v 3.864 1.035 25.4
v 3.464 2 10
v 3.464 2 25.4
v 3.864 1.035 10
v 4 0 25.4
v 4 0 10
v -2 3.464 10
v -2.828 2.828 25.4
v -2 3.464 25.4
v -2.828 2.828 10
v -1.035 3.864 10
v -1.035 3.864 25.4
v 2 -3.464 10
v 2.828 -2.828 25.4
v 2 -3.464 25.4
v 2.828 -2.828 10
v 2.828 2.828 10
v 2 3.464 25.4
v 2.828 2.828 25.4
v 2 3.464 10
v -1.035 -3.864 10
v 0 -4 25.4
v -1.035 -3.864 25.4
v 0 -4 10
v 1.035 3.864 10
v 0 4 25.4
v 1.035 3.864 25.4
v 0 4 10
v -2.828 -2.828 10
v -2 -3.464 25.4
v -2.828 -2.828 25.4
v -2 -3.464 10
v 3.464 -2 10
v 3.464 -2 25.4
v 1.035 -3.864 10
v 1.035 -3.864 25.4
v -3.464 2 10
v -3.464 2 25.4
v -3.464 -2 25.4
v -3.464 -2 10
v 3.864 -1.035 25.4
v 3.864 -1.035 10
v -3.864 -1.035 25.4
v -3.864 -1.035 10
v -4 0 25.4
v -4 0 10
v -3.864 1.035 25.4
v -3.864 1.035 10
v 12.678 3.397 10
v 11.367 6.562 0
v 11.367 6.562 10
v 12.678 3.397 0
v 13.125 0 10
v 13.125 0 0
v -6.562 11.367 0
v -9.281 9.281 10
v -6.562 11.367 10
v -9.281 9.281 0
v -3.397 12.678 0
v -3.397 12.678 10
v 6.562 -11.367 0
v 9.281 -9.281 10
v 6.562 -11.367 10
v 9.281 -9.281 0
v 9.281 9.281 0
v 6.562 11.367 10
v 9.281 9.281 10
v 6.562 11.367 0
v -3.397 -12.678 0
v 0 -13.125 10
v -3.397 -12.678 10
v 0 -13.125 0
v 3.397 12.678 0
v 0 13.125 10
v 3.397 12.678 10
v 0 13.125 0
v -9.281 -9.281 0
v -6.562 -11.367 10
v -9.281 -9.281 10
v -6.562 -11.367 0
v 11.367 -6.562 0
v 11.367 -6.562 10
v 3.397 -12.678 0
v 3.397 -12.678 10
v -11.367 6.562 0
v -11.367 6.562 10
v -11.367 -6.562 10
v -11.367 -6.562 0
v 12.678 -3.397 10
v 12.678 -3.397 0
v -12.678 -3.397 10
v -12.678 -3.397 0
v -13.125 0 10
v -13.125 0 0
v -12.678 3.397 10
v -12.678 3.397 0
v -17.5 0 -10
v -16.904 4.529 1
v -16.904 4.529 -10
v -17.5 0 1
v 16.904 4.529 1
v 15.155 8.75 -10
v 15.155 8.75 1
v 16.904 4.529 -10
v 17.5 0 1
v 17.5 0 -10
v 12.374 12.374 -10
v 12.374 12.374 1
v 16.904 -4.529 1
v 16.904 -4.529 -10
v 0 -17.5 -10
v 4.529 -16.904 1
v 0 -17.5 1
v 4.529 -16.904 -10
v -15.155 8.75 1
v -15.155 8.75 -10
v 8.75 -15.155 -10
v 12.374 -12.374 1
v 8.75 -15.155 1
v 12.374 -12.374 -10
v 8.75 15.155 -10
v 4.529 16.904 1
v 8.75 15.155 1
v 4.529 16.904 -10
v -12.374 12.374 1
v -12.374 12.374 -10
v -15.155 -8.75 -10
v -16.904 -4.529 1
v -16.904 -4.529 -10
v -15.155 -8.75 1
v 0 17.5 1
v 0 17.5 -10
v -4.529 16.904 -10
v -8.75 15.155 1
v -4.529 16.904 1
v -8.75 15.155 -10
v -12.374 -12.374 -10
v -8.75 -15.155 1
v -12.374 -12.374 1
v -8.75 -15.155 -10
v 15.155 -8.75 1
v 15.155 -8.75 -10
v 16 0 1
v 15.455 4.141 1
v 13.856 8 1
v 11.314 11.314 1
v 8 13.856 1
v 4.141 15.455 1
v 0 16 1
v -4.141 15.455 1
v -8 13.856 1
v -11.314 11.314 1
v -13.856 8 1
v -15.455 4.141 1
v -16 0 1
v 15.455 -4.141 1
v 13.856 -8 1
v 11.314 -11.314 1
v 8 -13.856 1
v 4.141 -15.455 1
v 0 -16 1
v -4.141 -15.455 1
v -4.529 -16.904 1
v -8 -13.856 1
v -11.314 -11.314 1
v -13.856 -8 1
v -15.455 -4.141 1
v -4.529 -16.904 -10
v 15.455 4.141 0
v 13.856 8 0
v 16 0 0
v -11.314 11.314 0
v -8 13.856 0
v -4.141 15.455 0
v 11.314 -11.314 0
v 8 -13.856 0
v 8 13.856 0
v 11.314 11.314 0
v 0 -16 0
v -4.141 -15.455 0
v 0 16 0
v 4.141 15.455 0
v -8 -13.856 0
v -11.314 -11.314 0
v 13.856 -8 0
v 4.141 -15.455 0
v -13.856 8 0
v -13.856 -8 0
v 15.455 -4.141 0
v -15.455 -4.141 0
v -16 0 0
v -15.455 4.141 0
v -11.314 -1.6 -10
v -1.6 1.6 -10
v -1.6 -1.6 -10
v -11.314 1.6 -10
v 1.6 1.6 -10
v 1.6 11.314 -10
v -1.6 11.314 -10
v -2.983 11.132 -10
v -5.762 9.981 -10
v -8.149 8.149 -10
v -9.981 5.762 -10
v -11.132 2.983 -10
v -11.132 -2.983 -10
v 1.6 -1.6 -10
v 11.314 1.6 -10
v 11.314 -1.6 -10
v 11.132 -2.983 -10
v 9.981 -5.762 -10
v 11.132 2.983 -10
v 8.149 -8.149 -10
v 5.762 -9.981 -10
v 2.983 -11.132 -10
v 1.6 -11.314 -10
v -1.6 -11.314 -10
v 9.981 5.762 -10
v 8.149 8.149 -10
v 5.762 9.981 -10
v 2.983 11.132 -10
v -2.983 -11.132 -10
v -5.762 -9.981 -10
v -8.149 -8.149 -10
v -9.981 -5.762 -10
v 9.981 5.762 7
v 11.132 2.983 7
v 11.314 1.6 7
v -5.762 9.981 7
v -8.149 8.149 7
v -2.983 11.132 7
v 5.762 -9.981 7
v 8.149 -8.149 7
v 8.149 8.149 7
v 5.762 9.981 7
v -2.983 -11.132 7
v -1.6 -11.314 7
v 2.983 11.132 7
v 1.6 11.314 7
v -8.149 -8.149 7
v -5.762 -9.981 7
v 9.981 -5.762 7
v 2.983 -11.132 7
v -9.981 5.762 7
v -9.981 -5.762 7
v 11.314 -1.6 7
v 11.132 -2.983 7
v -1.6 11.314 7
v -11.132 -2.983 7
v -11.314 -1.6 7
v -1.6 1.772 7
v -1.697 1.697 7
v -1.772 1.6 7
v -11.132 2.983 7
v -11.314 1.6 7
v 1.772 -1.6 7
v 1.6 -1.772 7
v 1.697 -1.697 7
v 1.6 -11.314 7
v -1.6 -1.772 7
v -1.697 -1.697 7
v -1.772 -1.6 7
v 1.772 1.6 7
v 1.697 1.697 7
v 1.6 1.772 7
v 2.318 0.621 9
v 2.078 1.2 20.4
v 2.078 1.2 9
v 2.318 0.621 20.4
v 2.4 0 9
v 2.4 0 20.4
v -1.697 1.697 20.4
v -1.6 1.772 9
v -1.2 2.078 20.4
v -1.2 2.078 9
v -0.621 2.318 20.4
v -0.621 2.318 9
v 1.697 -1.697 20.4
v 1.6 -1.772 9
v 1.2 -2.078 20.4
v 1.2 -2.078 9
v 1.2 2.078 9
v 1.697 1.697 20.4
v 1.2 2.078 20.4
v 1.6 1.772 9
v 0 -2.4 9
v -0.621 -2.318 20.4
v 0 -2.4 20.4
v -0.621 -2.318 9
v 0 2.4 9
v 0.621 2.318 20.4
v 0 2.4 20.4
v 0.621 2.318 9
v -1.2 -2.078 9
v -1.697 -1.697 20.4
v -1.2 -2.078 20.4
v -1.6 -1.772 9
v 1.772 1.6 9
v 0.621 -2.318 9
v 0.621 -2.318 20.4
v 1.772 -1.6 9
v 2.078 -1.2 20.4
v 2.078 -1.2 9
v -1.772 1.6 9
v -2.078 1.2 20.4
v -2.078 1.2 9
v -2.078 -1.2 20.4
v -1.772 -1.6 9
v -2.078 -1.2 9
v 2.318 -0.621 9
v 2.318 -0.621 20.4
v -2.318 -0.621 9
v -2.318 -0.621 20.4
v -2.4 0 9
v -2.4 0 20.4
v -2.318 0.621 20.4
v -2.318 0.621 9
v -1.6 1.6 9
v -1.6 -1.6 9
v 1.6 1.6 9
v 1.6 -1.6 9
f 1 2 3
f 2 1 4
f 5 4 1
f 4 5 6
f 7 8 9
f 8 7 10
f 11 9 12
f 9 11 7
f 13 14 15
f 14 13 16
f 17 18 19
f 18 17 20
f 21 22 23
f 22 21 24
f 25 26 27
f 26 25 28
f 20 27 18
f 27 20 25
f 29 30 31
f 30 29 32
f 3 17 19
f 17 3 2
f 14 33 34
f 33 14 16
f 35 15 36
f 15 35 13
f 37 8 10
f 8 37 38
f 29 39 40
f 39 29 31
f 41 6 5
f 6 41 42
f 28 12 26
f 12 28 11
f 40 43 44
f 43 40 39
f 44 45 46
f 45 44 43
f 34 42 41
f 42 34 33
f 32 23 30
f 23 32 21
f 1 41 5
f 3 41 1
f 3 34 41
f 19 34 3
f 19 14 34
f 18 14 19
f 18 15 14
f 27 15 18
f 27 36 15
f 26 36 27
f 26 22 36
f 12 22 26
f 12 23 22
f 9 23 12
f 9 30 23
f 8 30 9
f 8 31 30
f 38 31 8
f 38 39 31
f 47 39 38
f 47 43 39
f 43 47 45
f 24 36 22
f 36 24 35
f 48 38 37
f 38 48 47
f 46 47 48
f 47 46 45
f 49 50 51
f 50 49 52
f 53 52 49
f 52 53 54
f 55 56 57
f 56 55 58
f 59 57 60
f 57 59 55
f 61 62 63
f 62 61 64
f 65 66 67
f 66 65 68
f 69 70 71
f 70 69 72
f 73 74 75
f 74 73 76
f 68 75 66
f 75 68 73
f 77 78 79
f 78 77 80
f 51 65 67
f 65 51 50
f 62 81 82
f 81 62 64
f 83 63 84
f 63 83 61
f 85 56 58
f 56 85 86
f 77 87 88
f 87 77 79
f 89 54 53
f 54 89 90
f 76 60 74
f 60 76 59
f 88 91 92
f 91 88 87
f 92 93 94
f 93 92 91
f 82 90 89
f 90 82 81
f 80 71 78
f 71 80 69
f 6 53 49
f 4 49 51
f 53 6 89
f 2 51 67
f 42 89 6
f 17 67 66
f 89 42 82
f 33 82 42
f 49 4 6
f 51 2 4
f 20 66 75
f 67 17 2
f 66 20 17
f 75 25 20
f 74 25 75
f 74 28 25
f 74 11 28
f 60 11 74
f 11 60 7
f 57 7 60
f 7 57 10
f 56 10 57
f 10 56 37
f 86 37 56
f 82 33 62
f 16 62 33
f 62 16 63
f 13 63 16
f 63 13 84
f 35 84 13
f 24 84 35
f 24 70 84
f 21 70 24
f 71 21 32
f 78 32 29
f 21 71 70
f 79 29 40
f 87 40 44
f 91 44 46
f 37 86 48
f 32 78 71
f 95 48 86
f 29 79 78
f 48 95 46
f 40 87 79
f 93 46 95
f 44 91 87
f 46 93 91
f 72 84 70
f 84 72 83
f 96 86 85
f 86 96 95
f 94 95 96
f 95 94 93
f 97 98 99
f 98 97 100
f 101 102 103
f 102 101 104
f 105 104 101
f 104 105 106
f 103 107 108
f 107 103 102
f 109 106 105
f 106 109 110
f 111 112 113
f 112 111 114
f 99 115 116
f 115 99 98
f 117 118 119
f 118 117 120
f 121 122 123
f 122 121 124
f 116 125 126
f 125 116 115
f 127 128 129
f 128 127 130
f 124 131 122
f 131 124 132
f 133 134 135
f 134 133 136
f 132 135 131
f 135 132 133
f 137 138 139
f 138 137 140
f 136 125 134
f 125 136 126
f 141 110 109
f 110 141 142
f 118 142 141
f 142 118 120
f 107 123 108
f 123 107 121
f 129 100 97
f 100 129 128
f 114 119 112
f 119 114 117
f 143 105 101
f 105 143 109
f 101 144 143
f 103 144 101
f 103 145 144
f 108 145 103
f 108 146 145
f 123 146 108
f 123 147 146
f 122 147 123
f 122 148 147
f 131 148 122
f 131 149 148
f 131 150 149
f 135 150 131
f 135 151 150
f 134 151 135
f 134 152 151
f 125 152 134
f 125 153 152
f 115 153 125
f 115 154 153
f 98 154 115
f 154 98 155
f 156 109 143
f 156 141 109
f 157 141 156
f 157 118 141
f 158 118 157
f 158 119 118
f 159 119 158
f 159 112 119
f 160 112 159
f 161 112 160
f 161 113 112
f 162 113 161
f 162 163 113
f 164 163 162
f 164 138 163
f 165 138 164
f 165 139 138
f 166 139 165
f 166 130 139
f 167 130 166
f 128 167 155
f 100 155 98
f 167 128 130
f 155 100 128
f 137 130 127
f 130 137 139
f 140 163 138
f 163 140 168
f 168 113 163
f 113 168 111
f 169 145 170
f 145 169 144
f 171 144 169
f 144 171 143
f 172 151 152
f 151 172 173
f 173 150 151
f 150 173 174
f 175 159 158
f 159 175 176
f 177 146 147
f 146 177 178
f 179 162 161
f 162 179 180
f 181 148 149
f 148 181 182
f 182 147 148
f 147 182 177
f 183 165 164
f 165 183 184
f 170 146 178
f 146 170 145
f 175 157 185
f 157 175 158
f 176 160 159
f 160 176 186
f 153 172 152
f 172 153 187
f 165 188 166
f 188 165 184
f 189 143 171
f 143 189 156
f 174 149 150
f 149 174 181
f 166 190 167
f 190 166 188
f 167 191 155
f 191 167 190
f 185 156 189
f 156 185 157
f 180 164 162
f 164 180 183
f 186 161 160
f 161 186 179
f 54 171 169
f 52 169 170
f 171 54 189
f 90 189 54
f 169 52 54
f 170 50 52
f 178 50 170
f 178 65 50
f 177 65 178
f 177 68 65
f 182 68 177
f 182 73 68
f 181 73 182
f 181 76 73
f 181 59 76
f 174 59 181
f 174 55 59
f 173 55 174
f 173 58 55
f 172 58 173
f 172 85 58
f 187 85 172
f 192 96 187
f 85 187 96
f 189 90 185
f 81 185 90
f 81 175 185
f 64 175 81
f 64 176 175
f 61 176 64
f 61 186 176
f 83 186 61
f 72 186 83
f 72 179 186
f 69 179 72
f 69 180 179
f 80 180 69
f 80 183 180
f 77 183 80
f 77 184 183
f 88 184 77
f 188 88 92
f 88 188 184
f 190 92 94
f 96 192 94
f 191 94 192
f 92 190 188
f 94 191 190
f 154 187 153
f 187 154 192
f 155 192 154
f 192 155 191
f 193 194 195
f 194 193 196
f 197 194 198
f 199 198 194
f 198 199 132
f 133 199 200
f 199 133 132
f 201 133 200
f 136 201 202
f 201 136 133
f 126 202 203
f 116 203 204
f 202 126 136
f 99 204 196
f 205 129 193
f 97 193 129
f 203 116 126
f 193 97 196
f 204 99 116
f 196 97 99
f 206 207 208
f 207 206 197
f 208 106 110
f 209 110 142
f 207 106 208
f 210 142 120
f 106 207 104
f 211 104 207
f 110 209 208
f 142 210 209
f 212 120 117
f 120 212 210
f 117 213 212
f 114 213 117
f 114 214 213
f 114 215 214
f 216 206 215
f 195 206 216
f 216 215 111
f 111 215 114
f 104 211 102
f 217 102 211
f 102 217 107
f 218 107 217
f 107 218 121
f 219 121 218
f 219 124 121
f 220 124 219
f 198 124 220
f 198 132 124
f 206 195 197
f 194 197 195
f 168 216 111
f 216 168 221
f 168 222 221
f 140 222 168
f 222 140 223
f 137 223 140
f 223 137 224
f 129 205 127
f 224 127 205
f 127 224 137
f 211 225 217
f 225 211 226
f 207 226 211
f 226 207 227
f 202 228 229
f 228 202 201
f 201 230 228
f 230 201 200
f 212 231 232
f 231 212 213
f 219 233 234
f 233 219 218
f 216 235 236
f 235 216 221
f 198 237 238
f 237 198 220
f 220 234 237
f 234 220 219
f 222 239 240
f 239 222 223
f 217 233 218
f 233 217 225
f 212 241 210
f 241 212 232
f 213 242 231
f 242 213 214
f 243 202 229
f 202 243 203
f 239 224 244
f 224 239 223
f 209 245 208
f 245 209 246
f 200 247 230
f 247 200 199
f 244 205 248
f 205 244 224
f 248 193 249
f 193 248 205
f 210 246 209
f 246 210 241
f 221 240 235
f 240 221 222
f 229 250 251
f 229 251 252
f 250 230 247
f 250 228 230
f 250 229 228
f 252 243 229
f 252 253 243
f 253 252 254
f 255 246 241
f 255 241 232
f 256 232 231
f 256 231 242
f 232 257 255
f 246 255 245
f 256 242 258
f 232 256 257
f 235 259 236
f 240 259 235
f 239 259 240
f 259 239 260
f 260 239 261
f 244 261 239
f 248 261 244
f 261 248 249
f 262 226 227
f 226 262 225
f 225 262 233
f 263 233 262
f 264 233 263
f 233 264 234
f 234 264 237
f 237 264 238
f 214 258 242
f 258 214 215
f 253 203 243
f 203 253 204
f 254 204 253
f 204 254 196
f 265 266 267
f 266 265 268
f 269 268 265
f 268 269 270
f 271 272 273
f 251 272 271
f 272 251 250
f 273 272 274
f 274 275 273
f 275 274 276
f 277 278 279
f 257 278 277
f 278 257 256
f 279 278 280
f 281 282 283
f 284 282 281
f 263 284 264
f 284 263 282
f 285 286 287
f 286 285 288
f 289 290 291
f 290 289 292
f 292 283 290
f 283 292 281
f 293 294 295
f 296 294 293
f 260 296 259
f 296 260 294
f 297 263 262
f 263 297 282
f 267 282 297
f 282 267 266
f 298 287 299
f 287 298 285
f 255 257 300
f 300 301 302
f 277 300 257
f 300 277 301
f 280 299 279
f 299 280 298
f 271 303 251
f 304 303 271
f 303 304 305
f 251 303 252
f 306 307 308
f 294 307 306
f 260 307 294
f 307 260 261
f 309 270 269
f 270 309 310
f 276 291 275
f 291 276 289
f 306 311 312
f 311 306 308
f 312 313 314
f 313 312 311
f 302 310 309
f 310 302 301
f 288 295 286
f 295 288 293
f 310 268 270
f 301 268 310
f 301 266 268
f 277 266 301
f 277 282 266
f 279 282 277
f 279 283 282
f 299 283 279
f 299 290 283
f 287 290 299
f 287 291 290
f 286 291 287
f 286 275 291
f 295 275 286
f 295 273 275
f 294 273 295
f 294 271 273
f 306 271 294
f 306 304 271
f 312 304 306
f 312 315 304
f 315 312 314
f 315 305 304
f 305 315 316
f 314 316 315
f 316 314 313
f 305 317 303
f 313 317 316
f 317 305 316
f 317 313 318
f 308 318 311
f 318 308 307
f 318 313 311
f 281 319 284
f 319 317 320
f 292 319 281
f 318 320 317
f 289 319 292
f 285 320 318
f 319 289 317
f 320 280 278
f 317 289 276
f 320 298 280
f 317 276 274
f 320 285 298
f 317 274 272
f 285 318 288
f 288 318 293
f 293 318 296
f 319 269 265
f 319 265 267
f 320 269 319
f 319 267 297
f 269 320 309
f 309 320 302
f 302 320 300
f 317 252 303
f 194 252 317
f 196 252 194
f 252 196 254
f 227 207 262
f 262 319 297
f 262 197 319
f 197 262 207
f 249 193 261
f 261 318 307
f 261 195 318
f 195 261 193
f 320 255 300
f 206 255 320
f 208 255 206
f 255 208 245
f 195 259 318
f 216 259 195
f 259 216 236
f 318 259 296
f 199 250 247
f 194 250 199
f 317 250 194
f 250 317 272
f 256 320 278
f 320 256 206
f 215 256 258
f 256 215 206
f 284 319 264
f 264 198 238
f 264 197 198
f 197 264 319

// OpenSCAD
module StandBase
(
	height1=25.4,
	diam1=8,
	height2=10,
	diam2=26.25,
	quality=2,
)
{
	clr=0.1;
	translate([0,0,-clr])
	{
		union()
		{
			cylinder(h=height1+clr,d=diam1,$fn=12*quality);
			cylinder(h=height2+clr,d=diam2,$fn=12*quality);
		}
	}
}

module StandBottom
(
	height1=10,
	diam1=35,
	height2=1,
	diam2=32,
	quality=2,
)
{
	clr=0.1;
	union()
	{
		translate([0,0,-height1])
			cylinder(h=height1,d=diam1,$fn=12*quality);
		difference()
		{
			translate([0,0,-clr])
				cylinder(h=height2+clr,d=diam1,$fn=12*quality);
			cylinder(h=height2+clr,d=diam2,$fn=12*quality);
		}
	}
}

module Cuts
(
	height1=10-1+8,
	height2=25.4+10-5,
	heightBt=10,
	diam1=26.25-8*0.4,
	diam2=8-8*0.4,
	quality=2,
)
{
	clr=0.1;
	union()
	{
		translate([0,0,-heightBt-clr])
			cylinder(h=height1+clr,d=diam1,$fn=12*quality);
		translate([0,0,-heightBt-clr])
			cylinder(h=height2+clr,d=diam2,$fn=12*quality);
	}
}

module Fins
(
	height1=10-1+10,
	heightBt=10,
	diam1=26.25-8*0.4,
	finWidth=8*0.4
)
{
	clr=0.1;
	union()
	translate([0,0,-heightBt+height1/2])
	{
		cube([diam1,finWidth,height1],center=true);
		rotate(a=90,v=[0,0,1])
			cube([diam1,finWidth,height1],center=true);
	}
}

union()
{
	difference()
	{
		union()
		{
			StandBase();
			StandBottom();
		}
		Cuts();
	}
	Fins();
}
